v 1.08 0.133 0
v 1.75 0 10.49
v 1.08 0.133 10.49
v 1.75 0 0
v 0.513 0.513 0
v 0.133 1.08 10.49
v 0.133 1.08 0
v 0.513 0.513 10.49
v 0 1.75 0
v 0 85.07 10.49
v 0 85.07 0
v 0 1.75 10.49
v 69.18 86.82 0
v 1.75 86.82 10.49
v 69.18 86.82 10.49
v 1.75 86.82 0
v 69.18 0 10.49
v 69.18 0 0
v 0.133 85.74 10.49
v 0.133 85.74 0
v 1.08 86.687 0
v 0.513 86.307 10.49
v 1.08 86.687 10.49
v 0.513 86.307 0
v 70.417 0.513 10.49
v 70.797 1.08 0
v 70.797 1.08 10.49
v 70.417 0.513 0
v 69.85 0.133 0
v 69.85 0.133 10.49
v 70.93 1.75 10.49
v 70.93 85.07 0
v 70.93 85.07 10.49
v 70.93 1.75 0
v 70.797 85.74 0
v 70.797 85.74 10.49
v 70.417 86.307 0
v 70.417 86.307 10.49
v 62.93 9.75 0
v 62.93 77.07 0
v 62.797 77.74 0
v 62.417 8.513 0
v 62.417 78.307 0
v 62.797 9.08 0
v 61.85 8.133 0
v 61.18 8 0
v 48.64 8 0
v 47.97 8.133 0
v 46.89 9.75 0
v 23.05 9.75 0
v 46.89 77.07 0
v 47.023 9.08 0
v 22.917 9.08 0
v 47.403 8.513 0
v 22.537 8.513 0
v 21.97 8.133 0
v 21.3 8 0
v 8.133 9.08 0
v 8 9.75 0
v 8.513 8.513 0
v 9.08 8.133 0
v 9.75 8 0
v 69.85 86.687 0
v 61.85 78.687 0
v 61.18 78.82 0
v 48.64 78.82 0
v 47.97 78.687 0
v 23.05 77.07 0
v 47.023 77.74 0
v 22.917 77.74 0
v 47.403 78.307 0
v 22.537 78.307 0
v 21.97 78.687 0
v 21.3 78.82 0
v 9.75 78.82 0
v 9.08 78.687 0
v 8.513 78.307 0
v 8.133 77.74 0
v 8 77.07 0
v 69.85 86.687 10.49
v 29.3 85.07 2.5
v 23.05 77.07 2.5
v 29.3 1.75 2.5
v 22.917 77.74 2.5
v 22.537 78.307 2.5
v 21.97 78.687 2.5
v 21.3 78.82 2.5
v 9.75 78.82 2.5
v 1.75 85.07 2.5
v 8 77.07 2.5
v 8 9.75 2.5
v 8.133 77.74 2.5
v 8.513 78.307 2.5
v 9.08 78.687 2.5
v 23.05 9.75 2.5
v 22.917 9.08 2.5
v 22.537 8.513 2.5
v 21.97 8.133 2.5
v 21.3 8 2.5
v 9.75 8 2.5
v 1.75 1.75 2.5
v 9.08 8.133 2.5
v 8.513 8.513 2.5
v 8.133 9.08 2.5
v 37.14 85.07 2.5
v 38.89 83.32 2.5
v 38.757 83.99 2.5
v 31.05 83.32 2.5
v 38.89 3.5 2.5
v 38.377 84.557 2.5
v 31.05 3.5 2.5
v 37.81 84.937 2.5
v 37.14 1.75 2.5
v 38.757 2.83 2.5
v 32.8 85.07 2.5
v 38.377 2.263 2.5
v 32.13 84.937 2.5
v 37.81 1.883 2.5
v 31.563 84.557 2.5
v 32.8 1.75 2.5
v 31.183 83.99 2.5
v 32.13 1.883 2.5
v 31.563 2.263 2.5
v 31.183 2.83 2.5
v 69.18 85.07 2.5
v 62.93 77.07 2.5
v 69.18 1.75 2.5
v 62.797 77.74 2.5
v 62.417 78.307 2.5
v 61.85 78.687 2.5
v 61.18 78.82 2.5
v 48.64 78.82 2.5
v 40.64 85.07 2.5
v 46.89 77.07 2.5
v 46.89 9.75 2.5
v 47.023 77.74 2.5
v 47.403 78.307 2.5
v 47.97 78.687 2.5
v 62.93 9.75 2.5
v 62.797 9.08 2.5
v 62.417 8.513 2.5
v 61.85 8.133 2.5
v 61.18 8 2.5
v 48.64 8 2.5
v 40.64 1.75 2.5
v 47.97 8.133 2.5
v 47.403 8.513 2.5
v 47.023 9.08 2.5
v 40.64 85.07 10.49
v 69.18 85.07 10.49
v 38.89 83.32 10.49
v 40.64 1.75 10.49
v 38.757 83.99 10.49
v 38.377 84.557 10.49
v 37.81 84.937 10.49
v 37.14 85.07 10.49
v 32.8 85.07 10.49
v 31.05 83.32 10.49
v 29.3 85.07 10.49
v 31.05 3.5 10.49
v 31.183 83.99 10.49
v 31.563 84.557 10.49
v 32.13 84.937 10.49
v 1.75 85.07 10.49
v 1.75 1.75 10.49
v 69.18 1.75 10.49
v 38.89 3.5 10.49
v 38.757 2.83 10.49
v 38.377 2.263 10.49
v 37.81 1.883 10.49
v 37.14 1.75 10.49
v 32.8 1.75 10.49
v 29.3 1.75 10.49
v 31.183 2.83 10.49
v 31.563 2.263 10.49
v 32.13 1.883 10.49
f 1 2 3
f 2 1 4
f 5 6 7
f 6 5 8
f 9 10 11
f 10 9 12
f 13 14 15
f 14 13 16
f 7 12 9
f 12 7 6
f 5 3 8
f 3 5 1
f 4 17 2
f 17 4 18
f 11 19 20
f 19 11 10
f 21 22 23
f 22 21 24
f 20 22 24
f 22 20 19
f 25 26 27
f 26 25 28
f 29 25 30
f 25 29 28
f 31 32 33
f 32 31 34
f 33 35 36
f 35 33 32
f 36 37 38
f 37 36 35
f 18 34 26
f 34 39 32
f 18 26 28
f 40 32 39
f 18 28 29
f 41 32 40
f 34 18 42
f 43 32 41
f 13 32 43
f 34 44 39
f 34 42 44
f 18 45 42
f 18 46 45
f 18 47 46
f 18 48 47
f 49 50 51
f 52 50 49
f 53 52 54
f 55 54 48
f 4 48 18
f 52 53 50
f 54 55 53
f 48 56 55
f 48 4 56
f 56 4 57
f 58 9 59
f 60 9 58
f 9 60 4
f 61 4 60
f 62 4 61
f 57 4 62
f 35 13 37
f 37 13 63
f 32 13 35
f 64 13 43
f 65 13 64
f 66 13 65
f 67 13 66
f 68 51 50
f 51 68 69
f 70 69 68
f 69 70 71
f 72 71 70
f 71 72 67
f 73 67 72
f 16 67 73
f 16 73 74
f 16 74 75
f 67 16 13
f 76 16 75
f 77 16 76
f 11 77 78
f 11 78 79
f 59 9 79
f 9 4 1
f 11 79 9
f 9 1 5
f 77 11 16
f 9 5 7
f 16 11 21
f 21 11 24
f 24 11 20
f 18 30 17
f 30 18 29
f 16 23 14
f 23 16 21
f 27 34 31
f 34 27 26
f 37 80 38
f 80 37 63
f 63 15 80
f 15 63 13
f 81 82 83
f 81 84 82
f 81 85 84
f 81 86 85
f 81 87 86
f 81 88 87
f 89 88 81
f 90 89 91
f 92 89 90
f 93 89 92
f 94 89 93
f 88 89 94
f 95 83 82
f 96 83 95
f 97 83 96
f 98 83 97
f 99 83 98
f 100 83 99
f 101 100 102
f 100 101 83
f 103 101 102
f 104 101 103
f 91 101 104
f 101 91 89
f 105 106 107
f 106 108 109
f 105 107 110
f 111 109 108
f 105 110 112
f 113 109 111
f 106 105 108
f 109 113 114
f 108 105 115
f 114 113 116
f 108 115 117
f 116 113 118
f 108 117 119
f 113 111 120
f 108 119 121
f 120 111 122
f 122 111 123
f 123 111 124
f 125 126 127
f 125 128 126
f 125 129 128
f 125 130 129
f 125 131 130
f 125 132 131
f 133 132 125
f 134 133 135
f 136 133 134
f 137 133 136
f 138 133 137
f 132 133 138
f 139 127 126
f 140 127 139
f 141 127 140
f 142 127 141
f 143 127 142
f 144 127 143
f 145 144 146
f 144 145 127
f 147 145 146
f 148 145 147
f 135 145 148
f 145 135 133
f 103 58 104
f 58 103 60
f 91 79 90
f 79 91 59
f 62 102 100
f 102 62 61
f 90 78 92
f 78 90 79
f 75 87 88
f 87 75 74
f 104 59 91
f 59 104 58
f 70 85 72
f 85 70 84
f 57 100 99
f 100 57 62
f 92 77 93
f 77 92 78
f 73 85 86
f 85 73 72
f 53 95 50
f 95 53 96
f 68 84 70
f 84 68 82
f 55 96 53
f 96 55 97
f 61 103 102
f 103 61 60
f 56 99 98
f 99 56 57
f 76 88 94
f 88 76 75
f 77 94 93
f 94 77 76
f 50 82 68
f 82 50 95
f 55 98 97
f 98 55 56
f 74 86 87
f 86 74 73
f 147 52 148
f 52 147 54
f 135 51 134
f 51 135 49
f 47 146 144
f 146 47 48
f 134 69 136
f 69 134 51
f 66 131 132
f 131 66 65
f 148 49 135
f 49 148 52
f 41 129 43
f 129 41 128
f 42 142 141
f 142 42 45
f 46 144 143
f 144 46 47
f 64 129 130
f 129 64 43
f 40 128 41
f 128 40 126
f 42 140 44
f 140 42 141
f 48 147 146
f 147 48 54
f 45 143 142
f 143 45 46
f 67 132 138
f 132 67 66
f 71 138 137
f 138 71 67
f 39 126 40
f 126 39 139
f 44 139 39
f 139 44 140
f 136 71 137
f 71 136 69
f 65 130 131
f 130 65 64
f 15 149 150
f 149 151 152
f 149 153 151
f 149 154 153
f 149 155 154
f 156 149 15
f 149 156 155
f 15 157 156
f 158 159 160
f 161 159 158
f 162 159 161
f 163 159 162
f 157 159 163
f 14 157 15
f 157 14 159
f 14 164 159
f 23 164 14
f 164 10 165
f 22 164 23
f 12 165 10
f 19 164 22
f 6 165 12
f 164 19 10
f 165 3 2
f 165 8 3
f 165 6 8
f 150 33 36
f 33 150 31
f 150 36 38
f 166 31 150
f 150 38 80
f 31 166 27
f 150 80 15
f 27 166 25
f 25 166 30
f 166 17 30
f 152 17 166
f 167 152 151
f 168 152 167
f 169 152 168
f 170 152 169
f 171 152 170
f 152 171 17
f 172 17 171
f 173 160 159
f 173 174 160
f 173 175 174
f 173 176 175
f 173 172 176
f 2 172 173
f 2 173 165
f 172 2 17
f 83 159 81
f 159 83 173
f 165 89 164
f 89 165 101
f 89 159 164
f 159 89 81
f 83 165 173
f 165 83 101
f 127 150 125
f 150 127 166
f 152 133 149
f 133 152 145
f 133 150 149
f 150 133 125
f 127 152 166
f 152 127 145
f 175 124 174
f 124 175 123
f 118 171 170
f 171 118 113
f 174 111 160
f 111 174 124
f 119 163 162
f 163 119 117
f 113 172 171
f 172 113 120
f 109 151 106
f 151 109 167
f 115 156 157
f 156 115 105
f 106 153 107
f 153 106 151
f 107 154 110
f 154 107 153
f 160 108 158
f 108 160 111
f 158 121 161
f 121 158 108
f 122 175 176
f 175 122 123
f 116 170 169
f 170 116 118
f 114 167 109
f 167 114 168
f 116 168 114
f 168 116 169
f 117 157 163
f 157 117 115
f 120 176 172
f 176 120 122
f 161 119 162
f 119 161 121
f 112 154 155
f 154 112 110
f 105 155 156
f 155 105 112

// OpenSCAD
// file: roundedsquare.scad
module roundedSquare(size=[10,10], radius=1, center=false, $fn=16) {
    size1 = (size+0==size) ? [size,size] : size;
    if (radius <= 0) {
        square(size1, center=center);
    }
    else {
        translate(center ? -size1/2 : [0,0])
        hull() {
            translate([radius,radius]) circle(r=radius);
            translate([size1[0]-radius,radius]) circle(r=radius);
            translate([size1[0]-radius,size1[1]-radius]) circle(r=radius);
            translate([radius,size1[1]-radius]) circle(r=radius);
        }
    }
}

module roundedCube(size=[10,10,10], radius=1, center=false, $fn=16) {
    linear_extrude(height=size[2])
    roundedSquare(size=[size[0],size[1]], radius=radius, center=center);
}

module roundedOpenTopBox(size=[10,10,10], radius=2, wall=1, solid=false) {
    render(convexity=2)
    difference() {
        linear_extrude(height=size[2]) roundedSquare(size=[size[0],size[1]], radius=radius);
        if (!solid) {
            translate([0,0,wall])
            linear_extrude(height=size[2]-wall) 
            translate([wall,wall]) roundedSquare(size=[size[0]-2*wall,size[1]-2*wall], radius=radius-wall);
        }
    }
}
// main file
use <roundedsquare.scad>;

split = 11.34;
tolerance = 0.3;
length = 82.72;
leftHalfWidth = 26.95;
rightHalfWidth = 27.94;
wallHeight = 8;
wallThickness = 1.75;
baseWidth = 8;
baseThickness = 2.5;

module dummy() {}
nudge = 0.01;

w1 = leftHalfWidth + 2*tolerance + 2*wallThickness;
w2 = rightHalfWidth + 2*tolerance + 2*wallThickness;
innerSplit = split - 2*wallThickness;
l = length+2*wallThickness+2*tolerance;

render(convexity=3)
difference() {
    linear_extrude(height=baseThickness) roundedSquare([w1+innerSplit+w2,l],radius=wallThickness);
    translate([baseWidth,baseWidth,-nudge]) linear_extrude(height=baseThickness+2*nudge) roundedSquare([w1-baseWidth*2,l-baseWidth*2],radius=wallThickness);
    translate([baseWidth+w1+innerSplit,baseWidth,-nudge]) linear_extrude(height=baseThickness+2*nudge) roundedSquare([w2-baseWidth*2,l-baseWidth*2],radius=wallThickness);
}
render(convexity=3)
translate([0,0,baseThickness-nudge]) 
difference() {
    linear_extrude(height=wallHeight) roundedSquare([w1+innerSplit+w2,l],radius=wallThickness);
    translate([wallThickness,wallThickness,-nudge]) cube([w1-wallThickness*2,l-wallThickness*2,wallHeight+2*nudge]);
   translate([wallThickness+w1+innerSplit,wallThickness,-nudge]) cube([w2-wallThickness*2,l-wallThickness*2,wallHeight+2*nudge]);
    translate([w1,wallThickness,-nudge]) linear_extrude(height=wallHeight+2*nudge) roundedSquare([innerSplit,l-wallThickness*2],radius=wallThickness);
    
}
